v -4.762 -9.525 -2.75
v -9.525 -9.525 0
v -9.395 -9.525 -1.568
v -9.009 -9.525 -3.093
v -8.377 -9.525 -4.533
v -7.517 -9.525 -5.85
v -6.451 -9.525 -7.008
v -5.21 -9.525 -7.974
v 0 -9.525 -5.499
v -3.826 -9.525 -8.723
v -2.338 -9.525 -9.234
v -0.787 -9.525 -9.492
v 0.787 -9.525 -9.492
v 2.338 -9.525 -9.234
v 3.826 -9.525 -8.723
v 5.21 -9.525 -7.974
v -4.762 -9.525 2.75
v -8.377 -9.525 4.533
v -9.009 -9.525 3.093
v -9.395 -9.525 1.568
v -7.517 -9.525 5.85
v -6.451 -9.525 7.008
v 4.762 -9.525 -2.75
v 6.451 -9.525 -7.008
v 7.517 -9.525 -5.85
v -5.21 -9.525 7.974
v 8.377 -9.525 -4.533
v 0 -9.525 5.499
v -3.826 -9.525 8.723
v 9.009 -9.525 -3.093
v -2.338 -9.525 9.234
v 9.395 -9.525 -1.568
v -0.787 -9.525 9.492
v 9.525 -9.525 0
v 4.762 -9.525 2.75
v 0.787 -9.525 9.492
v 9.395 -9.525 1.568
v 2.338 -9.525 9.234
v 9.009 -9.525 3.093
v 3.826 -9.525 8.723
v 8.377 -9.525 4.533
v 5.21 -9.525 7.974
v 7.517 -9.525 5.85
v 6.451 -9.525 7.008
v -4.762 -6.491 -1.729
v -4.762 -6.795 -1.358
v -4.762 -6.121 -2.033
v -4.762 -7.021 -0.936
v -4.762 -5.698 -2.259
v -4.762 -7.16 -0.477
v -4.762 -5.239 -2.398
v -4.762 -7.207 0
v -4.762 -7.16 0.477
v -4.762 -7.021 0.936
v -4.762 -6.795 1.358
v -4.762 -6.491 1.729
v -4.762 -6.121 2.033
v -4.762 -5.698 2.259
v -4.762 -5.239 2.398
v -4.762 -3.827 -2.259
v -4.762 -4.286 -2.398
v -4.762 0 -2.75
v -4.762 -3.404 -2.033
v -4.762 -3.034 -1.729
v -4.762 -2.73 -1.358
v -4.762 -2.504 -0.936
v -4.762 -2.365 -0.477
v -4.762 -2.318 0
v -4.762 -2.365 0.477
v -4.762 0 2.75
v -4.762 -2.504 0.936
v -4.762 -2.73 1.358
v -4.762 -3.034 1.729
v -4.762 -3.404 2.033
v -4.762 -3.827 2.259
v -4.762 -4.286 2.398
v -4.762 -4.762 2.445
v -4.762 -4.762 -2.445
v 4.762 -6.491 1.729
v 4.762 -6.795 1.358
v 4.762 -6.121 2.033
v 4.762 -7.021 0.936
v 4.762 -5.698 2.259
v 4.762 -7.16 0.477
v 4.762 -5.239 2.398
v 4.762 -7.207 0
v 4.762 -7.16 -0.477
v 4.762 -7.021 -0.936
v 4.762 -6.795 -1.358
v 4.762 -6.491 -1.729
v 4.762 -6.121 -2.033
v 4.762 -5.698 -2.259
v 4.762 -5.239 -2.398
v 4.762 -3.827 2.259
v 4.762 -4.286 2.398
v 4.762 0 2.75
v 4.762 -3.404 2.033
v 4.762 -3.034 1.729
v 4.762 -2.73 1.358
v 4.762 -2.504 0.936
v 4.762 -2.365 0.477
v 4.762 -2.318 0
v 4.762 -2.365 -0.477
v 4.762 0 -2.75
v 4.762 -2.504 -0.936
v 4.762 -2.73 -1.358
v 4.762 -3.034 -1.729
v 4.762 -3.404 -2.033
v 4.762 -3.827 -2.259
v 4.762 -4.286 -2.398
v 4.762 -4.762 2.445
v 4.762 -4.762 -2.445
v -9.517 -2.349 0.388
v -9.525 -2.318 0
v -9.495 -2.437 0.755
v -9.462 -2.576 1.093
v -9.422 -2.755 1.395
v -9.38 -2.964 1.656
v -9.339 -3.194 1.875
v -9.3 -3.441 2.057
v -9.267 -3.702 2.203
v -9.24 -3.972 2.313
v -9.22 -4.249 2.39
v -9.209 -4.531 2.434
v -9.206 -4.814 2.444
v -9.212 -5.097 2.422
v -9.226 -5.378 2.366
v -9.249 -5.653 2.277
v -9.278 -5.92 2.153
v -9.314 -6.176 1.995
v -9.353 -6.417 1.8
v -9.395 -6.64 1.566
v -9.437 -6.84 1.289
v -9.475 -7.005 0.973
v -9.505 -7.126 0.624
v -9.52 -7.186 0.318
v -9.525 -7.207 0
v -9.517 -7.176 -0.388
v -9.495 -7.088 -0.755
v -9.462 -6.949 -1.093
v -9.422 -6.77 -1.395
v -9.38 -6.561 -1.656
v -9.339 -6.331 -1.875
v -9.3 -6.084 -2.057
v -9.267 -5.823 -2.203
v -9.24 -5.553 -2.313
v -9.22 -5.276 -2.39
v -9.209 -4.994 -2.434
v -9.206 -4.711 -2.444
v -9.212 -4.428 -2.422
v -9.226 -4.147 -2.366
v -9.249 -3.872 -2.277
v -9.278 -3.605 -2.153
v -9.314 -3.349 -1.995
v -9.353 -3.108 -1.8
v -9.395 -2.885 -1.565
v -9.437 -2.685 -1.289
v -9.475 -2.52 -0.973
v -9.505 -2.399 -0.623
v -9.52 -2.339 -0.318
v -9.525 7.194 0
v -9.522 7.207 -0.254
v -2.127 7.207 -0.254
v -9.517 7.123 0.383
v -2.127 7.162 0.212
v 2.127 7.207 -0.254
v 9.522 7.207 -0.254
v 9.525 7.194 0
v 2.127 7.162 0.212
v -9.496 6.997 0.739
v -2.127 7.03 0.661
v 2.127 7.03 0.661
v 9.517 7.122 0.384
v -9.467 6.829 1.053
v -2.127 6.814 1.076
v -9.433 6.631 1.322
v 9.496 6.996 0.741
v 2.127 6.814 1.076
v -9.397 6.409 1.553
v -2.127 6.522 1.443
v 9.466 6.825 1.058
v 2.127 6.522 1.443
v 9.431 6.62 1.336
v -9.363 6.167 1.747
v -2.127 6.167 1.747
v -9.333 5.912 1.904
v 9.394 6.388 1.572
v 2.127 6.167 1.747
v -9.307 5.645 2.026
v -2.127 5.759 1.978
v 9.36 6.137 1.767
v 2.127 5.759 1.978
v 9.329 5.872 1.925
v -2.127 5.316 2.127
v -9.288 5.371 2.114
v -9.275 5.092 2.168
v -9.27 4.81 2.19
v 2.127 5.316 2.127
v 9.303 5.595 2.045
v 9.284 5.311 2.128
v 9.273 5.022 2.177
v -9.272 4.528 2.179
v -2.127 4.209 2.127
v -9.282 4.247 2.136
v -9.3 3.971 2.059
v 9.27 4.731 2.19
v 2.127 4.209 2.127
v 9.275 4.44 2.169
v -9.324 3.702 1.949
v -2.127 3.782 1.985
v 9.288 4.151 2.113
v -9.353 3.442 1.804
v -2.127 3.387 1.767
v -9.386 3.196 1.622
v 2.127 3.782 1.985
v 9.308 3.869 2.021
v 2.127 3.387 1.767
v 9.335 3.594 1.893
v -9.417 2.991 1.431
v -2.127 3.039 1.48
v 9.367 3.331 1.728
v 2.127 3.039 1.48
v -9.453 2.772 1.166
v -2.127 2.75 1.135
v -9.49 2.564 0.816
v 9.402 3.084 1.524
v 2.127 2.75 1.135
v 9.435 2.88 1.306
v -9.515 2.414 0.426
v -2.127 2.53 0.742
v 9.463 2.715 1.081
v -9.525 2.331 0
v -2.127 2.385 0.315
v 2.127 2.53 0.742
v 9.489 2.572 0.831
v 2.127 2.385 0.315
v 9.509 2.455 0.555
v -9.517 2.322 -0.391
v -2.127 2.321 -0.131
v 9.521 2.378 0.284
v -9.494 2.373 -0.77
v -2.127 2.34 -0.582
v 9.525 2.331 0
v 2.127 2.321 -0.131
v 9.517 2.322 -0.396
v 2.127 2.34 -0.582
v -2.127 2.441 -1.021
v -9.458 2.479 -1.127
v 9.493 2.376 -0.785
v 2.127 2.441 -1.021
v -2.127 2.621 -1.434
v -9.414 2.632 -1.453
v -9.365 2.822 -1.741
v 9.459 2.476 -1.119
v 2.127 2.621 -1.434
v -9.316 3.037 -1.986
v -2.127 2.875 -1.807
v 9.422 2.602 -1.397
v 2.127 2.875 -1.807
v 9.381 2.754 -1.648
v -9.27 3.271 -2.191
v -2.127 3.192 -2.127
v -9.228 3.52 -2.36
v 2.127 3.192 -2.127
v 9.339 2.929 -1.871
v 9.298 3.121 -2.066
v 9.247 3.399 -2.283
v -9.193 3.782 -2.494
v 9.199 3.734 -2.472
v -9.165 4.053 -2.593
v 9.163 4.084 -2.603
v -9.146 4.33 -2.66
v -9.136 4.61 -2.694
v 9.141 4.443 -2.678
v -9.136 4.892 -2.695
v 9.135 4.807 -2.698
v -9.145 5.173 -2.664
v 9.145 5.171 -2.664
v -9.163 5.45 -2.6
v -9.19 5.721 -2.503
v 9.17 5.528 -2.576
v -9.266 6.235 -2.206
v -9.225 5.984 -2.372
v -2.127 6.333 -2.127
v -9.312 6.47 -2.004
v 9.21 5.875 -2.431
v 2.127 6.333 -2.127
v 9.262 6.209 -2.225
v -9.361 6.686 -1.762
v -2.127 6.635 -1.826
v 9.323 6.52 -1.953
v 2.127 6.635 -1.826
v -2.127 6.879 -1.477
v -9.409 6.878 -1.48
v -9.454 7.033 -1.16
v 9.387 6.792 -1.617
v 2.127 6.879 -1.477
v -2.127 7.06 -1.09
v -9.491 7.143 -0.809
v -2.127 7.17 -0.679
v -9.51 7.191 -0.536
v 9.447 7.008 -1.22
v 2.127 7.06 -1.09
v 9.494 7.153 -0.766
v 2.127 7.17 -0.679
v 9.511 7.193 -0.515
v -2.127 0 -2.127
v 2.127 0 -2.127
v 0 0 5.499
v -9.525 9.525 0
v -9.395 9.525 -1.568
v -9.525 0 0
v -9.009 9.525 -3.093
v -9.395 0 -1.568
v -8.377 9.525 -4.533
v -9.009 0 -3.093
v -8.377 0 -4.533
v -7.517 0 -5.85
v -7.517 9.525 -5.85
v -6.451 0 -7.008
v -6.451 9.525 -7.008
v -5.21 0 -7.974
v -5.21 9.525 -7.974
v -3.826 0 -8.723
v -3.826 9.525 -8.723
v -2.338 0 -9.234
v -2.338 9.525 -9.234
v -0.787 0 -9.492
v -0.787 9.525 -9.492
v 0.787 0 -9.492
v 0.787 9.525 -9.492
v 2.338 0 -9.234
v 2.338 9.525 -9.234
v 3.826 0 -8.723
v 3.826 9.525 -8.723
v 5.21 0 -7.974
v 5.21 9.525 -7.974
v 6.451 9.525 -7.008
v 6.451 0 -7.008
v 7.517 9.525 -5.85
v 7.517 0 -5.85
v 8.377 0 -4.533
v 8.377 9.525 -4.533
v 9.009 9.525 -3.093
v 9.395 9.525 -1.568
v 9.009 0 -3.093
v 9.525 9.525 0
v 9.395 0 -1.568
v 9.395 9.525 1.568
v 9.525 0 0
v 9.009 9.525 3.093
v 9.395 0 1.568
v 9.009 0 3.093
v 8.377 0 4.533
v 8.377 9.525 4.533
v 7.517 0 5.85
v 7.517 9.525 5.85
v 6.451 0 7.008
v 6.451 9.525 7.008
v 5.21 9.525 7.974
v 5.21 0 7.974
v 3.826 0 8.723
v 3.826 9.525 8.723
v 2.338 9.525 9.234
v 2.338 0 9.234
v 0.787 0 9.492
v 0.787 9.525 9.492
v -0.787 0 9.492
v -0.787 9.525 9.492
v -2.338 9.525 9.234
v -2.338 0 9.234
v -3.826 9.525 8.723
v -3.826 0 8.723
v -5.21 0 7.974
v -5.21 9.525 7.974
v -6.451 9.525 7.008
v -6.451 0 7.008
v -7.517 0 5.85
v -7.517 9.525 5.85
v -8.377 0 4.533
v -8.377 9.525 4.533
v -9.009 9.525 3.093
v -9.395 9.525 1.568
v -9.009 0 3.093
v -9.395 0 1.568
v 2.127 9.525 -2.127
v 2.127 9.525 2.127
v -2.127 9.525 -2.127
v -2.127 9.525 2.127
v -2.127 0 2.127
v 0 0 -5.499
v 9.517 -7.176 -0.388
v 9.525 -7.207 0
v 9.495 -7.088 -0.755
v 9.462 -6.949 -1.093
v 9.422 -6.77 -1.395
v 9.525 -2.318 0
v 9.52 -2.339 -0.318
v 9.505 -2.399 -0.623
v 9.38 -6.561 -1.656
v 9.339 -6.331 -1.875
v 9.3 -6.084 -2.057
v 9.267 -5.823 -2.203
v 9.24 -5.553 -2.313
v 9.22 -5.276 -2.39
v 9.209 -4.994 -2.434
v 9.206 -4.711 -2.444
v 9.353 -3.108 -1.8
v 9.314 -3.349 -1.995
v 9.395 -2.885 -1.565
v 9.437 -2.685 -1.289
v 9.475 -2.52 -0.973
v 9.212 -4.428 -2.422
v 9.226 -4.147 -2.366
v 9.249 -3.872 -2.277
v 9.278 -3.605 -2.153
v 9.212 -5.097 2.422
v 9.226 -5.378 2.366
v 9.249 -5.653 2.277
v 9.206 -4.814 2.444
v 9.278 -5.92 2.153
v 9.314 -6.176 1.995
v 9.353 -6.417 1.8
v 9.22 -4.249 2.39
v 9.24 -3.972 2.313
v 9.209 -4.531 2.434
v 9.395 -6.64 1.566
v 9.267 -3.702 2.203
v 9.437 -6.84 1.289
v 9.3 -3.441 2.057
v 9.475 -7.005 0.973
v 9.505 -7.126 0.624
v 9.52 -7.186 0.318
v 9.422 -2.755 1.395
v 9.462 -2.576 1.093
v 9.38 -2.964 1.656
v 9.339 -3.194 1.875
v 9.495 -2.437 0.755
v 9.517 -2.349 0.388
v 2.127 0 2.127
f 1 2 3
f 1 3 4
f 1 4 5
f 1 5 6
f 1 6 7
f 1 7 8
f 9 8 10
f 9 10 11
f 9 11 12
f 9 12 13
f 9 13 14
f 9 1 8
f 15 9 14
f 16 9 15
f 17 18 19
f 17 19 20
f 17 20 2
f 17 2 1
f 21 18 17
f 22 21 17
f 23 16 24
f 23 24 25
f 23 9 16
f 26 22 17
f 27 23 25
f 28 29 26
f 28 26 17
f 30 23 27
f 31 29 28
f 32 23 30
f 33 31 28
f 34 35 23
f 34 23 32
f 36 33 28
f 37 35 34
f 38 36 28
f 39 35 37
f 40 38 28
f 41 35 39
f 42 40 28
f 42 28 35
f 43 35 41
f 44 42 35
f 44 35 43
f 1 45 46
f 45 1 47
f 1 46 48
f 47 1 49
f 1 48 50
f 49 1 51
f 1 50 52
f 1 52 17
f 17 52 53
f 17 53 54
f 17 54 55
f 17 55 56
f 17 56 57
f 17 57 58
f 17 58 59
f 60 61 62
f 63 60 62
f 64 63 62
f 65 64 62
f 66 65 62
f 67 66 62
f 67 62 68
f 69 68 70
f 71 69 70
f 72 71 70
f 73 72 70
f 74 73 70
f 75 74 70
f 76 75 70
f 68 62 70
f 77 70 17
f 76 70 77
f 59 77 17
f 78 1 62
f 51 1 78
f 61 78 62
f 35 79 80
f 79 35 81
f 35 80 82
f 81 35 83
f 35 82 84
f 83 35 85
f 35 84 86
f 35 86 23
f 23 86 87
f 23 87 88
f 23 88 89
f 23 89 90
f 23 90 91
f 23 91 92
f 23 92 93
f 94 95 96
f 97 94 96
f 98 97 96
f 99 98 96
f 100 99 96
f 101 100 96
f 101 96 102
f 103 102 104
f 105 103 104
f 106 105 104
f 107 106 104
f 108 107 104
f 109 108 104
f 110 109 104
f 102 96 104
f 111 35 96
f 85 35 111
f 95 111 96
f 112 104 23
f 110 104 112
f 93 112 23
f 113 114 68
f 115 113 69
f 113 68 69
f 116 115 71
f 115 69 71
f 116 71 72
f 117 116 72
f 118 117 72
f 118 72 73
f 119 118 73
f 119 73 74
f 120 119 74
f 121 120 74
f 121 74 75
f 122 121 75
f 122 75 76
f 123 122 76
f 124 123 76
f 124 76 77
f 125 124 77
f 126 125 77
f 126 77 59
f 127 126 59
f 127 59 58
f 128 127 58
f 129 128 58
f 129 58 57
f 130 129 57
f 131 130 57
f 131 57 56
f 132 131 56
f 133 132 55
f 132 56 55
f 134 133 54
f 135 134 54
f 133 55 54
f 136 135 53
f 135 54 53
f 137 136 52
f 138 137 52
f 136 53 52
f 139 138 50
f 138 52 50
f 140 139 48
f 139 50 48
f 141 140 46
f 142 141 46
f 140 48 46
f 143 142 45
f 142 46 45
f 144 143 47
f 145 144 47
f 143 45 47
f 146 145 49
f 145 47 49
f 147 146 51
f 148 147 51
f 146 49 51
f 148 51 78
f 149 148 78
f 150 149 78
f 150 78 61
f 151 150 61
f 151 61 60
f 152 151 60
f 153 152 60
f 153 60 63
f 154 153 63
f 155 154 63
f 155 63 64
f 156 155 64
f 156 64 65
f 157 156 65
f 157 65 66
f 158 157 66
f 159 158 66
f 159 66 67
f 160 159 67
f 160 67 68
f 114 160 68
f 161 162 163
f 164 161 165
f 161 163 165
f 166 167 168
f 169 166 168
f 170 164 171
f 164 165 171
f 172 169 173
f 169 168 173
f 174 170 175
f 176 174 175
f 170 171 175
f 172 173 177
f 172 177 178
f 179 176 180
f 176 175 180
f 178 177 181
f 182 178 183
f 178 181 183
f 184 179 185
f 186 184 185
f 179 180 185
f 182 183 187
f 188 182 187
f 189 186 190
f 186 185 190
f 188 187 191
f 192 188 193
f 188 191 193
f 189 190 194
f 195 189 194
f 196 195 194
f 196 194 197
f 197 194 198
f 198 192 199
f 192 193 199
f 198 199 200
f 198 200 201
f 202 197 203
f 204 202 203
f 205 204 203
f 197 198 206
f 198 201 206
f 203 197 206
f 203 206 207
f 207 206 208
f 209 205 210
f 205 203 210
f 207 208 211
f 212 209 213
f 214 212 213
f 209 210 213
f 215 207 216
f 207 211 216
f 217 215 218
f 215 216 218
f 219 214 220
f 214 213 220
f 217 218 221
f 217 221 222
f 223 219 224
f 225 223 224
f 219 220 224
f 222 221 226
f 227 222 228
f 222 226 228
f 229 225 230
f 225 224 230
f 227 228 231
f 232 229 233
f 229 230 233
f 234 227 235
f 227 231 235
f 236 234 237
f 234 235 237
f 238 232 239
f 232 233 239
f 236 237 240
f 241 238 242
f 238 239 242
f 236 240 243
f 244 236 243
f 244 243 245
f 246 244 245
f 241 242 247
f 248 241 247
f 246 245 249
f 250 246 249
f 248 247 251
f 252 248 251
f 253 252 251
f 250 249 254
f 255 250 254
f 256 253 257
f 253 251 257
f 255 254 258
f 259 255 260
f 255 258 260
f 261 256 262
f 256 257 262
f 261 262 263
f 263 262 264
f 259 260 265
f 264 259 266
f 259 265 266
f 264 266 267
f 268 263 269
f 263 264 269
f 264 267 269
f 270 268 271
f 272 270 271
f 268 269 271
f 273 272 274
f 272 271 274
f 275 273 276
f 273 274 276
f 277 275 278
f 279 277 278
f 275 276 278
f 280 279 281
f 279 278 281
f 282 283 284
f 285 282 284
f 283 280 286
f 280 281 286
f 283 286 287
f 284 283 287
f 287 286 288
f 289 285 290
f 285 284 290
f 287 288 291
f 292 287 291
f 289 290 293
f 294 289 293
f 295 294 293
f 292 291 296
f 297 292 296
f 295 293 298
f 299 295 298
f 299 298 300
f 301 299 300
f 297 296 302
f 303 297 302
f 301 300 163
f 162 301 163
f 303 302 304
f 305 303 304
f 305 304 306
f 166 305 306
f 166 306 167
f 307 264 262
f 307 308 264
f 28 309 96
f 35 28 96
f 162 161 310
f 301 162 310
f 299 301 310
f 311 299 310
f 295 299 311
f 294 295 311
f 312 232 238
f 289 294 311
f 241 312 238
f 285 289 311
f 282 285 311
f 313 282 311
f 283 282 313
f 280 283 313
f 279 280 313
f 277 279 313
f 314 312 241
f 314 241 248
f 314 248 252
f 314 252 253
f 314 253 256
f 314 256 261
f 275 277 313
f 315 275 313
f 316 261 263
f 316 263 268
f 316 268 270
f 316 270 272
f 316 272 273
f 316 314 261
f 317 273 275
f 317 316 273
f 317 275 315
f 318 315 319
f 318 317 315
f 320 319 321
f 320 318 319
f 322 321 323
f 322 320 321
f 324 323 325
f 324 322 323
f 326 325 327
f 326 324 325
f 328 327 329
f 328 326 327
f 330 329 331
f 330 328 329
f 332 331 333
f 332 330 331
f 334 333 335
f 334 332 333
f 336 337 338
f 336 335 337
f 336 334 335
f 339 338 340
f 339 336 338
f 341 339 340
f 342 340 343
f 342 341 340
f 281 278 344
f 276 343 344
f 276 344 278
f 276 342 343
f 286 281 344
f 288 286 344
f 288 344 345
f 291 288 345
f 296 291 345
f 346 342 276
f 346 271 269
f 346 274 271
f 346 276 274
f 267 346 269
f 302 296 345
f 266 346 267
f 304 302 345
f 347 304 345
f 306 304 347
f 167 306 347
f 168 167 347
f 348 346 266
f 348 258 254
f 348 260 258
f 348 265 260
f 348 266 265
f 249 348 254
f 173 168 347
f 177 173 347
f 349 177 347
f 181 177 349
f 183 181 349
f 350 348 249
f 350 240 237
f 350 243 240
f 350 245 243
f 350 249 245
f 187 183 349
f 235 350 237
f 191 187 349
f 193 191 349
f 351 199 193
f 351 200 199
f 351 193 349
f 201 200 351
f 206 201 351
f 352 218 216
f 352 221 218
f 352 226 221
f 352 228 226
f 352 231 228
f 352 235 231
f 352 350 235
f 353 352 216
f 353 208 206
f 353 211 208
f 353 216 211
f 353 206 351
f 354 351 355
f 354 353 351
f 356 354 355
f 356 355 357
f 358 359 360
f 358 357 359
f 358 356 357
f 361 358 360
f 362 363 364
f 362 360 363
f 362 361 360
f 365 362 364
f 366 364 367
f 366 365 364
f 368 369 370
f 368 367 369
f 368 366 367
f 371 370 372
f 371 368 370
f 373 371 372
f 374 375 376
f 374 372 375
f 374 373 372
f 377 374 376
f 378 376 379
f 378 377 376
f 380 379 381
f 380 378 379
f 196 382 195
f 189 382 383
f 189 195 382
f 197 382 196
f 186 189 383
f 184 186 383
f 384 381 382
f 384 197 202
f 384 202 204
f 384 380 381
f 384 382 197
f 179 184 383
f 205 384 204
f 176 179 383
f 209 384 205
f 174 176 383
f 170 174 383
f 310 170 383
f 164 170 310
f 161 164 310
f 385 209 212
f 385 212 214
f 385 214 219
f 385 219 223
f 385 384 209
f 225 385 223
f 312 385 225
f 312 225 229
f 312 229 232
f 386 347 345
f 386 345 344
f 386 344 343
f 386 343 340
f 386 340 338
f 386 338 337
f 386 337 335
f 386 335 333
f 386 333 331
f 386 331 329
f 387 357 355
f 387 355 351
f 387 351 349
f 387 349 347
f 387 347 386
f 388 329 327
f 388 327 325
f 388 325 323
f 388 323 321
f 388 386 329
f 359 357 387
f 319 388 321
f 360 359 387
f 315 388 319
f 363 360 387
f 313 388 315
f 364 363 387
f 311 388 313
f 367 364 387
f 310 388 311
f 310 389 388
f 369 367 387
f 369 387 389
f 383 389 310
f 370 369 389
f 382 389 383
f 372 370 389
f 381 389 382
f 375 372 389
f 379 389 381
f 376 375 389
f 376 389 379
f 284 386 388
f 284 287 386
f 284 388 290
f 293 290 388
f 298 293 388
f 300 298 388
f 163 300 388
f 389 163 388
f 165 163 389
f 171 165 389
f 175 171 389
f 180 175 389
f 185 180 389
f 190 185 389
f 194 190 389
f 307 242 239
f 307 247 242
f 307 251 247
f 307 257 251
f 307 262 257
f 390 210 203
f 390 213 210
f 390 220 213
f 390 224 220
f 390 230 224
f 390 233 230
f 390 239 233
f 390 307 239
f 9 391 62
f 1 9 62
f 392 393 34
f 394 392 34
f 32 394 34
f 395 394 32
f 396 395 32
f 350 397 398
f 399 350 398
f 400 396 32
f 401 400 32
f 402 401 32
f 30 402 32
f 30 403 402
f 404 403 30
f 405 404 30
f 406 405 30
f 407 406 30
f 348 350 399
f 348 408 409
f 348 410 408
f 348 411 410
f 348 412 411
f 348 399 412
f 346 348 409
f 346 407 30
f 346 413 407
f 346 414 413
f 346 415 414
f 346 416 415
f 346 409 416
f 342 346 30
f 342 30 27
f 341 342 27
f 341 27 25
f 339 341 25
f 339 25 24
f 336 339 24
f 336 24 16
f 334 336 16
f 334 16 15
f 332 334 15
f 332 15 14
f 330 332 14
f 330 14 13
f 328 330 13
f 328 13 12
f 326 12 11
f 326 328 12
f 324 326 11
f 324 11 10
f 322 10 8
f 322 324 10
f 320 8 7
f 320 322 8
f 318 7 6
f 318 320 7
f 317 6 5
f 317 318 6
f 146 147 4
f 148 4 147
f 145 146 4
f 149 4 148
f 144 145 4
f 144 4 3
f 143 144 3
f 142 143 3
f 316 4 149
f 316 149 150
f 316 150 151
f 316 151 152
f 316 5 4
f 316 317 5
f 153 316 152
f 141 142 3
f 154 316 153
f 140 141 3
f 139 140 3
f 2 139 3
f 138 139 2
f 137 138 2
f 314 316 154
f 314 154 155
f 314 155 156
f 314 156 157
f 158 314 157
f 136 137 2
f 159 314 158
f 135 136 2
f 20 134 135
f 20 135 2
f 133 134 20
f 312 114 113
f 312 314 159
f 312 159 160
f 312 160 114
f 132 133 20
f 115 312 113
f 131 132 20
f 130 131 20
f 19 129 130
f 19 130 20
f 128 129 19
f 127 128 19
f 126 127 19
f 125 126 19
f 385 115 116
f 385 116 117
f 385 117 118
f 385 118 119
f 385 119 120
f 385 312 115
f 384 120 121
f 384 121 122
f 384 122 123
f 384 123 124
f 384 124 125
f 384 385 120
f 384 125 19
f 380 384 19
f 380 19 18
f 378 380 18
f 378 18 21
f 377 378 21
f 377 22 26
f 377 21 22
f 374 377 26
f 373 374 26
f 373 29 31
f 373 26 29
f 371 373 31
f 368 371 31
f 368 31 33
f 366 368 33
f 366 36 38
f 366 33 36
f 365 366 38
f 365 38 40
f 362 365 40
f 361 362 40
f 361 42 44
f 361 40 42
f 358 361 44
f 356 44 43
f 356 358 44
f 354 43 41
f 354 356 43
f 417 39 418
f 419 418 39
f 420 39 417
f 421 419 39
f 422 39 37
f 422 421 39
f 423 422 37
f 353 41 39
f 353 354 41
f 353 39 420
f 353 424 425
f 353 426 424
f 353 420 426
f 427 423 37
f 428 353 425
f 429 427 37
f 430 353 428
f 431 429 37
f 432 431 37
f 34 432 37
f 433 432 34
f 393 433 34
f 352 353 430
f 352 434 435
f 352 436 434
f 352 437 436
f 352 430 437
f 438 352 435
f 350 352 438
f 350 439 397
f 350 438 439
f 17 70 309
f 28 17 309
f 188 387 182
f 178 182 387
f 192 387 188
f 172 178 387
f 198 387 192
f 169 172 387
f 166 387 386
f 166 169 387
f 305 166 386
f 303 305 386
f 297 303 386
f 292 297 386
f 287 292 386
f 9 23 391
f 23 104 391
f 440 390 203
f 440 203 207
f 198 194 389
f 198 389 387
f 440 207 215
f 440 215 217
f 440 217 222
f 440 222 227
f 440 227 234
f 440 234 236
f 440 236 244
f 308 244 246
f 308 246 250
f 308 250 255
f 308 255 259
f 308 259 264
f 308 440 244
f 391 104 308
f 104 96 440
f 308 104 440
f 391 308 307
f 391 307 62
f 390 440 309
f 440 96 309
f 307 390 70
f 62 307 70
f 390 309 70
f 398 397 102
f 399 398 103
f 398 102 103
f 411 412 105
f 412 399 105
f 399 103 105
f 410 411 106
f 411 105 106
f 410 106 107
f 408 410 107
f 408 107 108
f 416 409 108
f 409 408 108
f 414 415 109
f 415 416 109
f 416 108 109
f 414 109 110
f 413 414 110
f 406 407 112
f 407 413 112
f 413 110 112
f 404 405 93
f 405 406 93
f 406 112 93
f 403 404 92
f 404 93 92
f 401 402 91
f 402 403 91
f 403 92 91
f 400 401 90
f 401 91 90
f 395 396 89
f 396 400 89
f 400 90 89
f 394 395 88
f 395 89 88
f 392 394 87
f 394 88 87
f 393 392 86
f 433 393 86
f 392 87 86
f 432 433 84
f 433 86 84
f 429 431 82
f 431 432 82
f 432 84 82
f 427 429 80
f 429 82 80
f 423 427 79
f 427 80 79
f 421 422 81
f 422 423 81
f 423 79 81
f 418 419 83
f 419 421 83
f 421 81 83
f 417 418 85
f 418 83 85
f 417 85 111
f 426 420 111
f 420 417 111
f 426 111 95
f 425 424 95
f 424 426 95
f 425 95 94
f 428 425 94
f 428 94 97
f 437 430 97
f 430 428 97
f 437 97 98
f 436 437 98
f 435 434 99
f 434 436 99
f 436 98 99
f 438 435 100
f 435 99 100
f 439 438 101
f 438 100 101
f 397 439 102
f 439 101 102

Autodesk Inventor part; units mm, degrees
ref_plane "YZ Plane" through (0, 0, 0) normal (1, 0, 0) x (0, 1, 0)
ref_plane "XZ Plane" through (0, 0, 0) normal (0, 1, 0) x (-1, 0, 0)
ref_plane "XY Plane" through (0, 0, 0) normal (0, 0, 1) x (1, 0, 0)
sketch "Sketch1" plane through (0, 0, 0) normal (0, 1, 0) x (-1, 0, 0)
  line L0 (2.1273, 2.1273) -> (-2.1273, 2.1273)
  line L1 (-2.1273, 2.1273) -> (-2.1273, -2.1273)
  line L2 (-2.1273, -2.1273) -> (2.1273, -2.1273)
  line L3 (2.1273, -2.1273) -> (2.1273, 2.1273)
  circle A0 centre (0, 0) radius 9.525
  point P0 (2.1273, 0)
  point P1 (0, -2.1272)
  dimension "d0" = 4.2545
  dimension "d1" = 19.05
extrude "Extrusion1" add sketch "Sketch1" along normal blind 9.525
sketch "Sketch2" plane through (0, 0, 0) normal (0, -1, 0) x (1, 0, 0)
  line L0 (-4.7625, 2.7496) -> (0, 5.4993)
  line L1 (0, 5.4993) -> (4.7625, 2.7496)
  line L2 (4.7625, 2.7496) -> (4.7625, -2.7496)
  line L3 (4.7625, -2.7496) -> (0, -5.4993)
  line L4 (0, -5.4993) -> (-4.7625, -2.7496)
  line L5 (-4.7625, -2.7496) -> (-4.7625, 2.7496)
  circle A0 centre (0, 0) radius 9.525 projected
  dimension "d4" = 9.525
extrude "Extrusion2" add sketch "Sketch2" along normal blind 9.525
sketch "Sketch3" plane through (0, 0, 0) normal (1, 0, 0) x (0, 1, 0)
  circle A0 centre (-4.7625, 0) radius 2.4447
  circle A1 centre (4.7625, -0.254) radius 2.4447
  line L0 (0, 2.1273) -> (9.525, 2.1273) projected
  line L1 (0, 2.7496) -> (-9.525, 2.7496) projected
  point P0 (0, 0)
  point P1 (-4.7625, 2.7496)
  point P2 (4.7625, 2.1273)
  dimension "d7" = 4.8895
  dimension "d8" = 4.8895
extrude "Extrusion3" cut sketch "Sketch3" along normal mid plane 19.05
